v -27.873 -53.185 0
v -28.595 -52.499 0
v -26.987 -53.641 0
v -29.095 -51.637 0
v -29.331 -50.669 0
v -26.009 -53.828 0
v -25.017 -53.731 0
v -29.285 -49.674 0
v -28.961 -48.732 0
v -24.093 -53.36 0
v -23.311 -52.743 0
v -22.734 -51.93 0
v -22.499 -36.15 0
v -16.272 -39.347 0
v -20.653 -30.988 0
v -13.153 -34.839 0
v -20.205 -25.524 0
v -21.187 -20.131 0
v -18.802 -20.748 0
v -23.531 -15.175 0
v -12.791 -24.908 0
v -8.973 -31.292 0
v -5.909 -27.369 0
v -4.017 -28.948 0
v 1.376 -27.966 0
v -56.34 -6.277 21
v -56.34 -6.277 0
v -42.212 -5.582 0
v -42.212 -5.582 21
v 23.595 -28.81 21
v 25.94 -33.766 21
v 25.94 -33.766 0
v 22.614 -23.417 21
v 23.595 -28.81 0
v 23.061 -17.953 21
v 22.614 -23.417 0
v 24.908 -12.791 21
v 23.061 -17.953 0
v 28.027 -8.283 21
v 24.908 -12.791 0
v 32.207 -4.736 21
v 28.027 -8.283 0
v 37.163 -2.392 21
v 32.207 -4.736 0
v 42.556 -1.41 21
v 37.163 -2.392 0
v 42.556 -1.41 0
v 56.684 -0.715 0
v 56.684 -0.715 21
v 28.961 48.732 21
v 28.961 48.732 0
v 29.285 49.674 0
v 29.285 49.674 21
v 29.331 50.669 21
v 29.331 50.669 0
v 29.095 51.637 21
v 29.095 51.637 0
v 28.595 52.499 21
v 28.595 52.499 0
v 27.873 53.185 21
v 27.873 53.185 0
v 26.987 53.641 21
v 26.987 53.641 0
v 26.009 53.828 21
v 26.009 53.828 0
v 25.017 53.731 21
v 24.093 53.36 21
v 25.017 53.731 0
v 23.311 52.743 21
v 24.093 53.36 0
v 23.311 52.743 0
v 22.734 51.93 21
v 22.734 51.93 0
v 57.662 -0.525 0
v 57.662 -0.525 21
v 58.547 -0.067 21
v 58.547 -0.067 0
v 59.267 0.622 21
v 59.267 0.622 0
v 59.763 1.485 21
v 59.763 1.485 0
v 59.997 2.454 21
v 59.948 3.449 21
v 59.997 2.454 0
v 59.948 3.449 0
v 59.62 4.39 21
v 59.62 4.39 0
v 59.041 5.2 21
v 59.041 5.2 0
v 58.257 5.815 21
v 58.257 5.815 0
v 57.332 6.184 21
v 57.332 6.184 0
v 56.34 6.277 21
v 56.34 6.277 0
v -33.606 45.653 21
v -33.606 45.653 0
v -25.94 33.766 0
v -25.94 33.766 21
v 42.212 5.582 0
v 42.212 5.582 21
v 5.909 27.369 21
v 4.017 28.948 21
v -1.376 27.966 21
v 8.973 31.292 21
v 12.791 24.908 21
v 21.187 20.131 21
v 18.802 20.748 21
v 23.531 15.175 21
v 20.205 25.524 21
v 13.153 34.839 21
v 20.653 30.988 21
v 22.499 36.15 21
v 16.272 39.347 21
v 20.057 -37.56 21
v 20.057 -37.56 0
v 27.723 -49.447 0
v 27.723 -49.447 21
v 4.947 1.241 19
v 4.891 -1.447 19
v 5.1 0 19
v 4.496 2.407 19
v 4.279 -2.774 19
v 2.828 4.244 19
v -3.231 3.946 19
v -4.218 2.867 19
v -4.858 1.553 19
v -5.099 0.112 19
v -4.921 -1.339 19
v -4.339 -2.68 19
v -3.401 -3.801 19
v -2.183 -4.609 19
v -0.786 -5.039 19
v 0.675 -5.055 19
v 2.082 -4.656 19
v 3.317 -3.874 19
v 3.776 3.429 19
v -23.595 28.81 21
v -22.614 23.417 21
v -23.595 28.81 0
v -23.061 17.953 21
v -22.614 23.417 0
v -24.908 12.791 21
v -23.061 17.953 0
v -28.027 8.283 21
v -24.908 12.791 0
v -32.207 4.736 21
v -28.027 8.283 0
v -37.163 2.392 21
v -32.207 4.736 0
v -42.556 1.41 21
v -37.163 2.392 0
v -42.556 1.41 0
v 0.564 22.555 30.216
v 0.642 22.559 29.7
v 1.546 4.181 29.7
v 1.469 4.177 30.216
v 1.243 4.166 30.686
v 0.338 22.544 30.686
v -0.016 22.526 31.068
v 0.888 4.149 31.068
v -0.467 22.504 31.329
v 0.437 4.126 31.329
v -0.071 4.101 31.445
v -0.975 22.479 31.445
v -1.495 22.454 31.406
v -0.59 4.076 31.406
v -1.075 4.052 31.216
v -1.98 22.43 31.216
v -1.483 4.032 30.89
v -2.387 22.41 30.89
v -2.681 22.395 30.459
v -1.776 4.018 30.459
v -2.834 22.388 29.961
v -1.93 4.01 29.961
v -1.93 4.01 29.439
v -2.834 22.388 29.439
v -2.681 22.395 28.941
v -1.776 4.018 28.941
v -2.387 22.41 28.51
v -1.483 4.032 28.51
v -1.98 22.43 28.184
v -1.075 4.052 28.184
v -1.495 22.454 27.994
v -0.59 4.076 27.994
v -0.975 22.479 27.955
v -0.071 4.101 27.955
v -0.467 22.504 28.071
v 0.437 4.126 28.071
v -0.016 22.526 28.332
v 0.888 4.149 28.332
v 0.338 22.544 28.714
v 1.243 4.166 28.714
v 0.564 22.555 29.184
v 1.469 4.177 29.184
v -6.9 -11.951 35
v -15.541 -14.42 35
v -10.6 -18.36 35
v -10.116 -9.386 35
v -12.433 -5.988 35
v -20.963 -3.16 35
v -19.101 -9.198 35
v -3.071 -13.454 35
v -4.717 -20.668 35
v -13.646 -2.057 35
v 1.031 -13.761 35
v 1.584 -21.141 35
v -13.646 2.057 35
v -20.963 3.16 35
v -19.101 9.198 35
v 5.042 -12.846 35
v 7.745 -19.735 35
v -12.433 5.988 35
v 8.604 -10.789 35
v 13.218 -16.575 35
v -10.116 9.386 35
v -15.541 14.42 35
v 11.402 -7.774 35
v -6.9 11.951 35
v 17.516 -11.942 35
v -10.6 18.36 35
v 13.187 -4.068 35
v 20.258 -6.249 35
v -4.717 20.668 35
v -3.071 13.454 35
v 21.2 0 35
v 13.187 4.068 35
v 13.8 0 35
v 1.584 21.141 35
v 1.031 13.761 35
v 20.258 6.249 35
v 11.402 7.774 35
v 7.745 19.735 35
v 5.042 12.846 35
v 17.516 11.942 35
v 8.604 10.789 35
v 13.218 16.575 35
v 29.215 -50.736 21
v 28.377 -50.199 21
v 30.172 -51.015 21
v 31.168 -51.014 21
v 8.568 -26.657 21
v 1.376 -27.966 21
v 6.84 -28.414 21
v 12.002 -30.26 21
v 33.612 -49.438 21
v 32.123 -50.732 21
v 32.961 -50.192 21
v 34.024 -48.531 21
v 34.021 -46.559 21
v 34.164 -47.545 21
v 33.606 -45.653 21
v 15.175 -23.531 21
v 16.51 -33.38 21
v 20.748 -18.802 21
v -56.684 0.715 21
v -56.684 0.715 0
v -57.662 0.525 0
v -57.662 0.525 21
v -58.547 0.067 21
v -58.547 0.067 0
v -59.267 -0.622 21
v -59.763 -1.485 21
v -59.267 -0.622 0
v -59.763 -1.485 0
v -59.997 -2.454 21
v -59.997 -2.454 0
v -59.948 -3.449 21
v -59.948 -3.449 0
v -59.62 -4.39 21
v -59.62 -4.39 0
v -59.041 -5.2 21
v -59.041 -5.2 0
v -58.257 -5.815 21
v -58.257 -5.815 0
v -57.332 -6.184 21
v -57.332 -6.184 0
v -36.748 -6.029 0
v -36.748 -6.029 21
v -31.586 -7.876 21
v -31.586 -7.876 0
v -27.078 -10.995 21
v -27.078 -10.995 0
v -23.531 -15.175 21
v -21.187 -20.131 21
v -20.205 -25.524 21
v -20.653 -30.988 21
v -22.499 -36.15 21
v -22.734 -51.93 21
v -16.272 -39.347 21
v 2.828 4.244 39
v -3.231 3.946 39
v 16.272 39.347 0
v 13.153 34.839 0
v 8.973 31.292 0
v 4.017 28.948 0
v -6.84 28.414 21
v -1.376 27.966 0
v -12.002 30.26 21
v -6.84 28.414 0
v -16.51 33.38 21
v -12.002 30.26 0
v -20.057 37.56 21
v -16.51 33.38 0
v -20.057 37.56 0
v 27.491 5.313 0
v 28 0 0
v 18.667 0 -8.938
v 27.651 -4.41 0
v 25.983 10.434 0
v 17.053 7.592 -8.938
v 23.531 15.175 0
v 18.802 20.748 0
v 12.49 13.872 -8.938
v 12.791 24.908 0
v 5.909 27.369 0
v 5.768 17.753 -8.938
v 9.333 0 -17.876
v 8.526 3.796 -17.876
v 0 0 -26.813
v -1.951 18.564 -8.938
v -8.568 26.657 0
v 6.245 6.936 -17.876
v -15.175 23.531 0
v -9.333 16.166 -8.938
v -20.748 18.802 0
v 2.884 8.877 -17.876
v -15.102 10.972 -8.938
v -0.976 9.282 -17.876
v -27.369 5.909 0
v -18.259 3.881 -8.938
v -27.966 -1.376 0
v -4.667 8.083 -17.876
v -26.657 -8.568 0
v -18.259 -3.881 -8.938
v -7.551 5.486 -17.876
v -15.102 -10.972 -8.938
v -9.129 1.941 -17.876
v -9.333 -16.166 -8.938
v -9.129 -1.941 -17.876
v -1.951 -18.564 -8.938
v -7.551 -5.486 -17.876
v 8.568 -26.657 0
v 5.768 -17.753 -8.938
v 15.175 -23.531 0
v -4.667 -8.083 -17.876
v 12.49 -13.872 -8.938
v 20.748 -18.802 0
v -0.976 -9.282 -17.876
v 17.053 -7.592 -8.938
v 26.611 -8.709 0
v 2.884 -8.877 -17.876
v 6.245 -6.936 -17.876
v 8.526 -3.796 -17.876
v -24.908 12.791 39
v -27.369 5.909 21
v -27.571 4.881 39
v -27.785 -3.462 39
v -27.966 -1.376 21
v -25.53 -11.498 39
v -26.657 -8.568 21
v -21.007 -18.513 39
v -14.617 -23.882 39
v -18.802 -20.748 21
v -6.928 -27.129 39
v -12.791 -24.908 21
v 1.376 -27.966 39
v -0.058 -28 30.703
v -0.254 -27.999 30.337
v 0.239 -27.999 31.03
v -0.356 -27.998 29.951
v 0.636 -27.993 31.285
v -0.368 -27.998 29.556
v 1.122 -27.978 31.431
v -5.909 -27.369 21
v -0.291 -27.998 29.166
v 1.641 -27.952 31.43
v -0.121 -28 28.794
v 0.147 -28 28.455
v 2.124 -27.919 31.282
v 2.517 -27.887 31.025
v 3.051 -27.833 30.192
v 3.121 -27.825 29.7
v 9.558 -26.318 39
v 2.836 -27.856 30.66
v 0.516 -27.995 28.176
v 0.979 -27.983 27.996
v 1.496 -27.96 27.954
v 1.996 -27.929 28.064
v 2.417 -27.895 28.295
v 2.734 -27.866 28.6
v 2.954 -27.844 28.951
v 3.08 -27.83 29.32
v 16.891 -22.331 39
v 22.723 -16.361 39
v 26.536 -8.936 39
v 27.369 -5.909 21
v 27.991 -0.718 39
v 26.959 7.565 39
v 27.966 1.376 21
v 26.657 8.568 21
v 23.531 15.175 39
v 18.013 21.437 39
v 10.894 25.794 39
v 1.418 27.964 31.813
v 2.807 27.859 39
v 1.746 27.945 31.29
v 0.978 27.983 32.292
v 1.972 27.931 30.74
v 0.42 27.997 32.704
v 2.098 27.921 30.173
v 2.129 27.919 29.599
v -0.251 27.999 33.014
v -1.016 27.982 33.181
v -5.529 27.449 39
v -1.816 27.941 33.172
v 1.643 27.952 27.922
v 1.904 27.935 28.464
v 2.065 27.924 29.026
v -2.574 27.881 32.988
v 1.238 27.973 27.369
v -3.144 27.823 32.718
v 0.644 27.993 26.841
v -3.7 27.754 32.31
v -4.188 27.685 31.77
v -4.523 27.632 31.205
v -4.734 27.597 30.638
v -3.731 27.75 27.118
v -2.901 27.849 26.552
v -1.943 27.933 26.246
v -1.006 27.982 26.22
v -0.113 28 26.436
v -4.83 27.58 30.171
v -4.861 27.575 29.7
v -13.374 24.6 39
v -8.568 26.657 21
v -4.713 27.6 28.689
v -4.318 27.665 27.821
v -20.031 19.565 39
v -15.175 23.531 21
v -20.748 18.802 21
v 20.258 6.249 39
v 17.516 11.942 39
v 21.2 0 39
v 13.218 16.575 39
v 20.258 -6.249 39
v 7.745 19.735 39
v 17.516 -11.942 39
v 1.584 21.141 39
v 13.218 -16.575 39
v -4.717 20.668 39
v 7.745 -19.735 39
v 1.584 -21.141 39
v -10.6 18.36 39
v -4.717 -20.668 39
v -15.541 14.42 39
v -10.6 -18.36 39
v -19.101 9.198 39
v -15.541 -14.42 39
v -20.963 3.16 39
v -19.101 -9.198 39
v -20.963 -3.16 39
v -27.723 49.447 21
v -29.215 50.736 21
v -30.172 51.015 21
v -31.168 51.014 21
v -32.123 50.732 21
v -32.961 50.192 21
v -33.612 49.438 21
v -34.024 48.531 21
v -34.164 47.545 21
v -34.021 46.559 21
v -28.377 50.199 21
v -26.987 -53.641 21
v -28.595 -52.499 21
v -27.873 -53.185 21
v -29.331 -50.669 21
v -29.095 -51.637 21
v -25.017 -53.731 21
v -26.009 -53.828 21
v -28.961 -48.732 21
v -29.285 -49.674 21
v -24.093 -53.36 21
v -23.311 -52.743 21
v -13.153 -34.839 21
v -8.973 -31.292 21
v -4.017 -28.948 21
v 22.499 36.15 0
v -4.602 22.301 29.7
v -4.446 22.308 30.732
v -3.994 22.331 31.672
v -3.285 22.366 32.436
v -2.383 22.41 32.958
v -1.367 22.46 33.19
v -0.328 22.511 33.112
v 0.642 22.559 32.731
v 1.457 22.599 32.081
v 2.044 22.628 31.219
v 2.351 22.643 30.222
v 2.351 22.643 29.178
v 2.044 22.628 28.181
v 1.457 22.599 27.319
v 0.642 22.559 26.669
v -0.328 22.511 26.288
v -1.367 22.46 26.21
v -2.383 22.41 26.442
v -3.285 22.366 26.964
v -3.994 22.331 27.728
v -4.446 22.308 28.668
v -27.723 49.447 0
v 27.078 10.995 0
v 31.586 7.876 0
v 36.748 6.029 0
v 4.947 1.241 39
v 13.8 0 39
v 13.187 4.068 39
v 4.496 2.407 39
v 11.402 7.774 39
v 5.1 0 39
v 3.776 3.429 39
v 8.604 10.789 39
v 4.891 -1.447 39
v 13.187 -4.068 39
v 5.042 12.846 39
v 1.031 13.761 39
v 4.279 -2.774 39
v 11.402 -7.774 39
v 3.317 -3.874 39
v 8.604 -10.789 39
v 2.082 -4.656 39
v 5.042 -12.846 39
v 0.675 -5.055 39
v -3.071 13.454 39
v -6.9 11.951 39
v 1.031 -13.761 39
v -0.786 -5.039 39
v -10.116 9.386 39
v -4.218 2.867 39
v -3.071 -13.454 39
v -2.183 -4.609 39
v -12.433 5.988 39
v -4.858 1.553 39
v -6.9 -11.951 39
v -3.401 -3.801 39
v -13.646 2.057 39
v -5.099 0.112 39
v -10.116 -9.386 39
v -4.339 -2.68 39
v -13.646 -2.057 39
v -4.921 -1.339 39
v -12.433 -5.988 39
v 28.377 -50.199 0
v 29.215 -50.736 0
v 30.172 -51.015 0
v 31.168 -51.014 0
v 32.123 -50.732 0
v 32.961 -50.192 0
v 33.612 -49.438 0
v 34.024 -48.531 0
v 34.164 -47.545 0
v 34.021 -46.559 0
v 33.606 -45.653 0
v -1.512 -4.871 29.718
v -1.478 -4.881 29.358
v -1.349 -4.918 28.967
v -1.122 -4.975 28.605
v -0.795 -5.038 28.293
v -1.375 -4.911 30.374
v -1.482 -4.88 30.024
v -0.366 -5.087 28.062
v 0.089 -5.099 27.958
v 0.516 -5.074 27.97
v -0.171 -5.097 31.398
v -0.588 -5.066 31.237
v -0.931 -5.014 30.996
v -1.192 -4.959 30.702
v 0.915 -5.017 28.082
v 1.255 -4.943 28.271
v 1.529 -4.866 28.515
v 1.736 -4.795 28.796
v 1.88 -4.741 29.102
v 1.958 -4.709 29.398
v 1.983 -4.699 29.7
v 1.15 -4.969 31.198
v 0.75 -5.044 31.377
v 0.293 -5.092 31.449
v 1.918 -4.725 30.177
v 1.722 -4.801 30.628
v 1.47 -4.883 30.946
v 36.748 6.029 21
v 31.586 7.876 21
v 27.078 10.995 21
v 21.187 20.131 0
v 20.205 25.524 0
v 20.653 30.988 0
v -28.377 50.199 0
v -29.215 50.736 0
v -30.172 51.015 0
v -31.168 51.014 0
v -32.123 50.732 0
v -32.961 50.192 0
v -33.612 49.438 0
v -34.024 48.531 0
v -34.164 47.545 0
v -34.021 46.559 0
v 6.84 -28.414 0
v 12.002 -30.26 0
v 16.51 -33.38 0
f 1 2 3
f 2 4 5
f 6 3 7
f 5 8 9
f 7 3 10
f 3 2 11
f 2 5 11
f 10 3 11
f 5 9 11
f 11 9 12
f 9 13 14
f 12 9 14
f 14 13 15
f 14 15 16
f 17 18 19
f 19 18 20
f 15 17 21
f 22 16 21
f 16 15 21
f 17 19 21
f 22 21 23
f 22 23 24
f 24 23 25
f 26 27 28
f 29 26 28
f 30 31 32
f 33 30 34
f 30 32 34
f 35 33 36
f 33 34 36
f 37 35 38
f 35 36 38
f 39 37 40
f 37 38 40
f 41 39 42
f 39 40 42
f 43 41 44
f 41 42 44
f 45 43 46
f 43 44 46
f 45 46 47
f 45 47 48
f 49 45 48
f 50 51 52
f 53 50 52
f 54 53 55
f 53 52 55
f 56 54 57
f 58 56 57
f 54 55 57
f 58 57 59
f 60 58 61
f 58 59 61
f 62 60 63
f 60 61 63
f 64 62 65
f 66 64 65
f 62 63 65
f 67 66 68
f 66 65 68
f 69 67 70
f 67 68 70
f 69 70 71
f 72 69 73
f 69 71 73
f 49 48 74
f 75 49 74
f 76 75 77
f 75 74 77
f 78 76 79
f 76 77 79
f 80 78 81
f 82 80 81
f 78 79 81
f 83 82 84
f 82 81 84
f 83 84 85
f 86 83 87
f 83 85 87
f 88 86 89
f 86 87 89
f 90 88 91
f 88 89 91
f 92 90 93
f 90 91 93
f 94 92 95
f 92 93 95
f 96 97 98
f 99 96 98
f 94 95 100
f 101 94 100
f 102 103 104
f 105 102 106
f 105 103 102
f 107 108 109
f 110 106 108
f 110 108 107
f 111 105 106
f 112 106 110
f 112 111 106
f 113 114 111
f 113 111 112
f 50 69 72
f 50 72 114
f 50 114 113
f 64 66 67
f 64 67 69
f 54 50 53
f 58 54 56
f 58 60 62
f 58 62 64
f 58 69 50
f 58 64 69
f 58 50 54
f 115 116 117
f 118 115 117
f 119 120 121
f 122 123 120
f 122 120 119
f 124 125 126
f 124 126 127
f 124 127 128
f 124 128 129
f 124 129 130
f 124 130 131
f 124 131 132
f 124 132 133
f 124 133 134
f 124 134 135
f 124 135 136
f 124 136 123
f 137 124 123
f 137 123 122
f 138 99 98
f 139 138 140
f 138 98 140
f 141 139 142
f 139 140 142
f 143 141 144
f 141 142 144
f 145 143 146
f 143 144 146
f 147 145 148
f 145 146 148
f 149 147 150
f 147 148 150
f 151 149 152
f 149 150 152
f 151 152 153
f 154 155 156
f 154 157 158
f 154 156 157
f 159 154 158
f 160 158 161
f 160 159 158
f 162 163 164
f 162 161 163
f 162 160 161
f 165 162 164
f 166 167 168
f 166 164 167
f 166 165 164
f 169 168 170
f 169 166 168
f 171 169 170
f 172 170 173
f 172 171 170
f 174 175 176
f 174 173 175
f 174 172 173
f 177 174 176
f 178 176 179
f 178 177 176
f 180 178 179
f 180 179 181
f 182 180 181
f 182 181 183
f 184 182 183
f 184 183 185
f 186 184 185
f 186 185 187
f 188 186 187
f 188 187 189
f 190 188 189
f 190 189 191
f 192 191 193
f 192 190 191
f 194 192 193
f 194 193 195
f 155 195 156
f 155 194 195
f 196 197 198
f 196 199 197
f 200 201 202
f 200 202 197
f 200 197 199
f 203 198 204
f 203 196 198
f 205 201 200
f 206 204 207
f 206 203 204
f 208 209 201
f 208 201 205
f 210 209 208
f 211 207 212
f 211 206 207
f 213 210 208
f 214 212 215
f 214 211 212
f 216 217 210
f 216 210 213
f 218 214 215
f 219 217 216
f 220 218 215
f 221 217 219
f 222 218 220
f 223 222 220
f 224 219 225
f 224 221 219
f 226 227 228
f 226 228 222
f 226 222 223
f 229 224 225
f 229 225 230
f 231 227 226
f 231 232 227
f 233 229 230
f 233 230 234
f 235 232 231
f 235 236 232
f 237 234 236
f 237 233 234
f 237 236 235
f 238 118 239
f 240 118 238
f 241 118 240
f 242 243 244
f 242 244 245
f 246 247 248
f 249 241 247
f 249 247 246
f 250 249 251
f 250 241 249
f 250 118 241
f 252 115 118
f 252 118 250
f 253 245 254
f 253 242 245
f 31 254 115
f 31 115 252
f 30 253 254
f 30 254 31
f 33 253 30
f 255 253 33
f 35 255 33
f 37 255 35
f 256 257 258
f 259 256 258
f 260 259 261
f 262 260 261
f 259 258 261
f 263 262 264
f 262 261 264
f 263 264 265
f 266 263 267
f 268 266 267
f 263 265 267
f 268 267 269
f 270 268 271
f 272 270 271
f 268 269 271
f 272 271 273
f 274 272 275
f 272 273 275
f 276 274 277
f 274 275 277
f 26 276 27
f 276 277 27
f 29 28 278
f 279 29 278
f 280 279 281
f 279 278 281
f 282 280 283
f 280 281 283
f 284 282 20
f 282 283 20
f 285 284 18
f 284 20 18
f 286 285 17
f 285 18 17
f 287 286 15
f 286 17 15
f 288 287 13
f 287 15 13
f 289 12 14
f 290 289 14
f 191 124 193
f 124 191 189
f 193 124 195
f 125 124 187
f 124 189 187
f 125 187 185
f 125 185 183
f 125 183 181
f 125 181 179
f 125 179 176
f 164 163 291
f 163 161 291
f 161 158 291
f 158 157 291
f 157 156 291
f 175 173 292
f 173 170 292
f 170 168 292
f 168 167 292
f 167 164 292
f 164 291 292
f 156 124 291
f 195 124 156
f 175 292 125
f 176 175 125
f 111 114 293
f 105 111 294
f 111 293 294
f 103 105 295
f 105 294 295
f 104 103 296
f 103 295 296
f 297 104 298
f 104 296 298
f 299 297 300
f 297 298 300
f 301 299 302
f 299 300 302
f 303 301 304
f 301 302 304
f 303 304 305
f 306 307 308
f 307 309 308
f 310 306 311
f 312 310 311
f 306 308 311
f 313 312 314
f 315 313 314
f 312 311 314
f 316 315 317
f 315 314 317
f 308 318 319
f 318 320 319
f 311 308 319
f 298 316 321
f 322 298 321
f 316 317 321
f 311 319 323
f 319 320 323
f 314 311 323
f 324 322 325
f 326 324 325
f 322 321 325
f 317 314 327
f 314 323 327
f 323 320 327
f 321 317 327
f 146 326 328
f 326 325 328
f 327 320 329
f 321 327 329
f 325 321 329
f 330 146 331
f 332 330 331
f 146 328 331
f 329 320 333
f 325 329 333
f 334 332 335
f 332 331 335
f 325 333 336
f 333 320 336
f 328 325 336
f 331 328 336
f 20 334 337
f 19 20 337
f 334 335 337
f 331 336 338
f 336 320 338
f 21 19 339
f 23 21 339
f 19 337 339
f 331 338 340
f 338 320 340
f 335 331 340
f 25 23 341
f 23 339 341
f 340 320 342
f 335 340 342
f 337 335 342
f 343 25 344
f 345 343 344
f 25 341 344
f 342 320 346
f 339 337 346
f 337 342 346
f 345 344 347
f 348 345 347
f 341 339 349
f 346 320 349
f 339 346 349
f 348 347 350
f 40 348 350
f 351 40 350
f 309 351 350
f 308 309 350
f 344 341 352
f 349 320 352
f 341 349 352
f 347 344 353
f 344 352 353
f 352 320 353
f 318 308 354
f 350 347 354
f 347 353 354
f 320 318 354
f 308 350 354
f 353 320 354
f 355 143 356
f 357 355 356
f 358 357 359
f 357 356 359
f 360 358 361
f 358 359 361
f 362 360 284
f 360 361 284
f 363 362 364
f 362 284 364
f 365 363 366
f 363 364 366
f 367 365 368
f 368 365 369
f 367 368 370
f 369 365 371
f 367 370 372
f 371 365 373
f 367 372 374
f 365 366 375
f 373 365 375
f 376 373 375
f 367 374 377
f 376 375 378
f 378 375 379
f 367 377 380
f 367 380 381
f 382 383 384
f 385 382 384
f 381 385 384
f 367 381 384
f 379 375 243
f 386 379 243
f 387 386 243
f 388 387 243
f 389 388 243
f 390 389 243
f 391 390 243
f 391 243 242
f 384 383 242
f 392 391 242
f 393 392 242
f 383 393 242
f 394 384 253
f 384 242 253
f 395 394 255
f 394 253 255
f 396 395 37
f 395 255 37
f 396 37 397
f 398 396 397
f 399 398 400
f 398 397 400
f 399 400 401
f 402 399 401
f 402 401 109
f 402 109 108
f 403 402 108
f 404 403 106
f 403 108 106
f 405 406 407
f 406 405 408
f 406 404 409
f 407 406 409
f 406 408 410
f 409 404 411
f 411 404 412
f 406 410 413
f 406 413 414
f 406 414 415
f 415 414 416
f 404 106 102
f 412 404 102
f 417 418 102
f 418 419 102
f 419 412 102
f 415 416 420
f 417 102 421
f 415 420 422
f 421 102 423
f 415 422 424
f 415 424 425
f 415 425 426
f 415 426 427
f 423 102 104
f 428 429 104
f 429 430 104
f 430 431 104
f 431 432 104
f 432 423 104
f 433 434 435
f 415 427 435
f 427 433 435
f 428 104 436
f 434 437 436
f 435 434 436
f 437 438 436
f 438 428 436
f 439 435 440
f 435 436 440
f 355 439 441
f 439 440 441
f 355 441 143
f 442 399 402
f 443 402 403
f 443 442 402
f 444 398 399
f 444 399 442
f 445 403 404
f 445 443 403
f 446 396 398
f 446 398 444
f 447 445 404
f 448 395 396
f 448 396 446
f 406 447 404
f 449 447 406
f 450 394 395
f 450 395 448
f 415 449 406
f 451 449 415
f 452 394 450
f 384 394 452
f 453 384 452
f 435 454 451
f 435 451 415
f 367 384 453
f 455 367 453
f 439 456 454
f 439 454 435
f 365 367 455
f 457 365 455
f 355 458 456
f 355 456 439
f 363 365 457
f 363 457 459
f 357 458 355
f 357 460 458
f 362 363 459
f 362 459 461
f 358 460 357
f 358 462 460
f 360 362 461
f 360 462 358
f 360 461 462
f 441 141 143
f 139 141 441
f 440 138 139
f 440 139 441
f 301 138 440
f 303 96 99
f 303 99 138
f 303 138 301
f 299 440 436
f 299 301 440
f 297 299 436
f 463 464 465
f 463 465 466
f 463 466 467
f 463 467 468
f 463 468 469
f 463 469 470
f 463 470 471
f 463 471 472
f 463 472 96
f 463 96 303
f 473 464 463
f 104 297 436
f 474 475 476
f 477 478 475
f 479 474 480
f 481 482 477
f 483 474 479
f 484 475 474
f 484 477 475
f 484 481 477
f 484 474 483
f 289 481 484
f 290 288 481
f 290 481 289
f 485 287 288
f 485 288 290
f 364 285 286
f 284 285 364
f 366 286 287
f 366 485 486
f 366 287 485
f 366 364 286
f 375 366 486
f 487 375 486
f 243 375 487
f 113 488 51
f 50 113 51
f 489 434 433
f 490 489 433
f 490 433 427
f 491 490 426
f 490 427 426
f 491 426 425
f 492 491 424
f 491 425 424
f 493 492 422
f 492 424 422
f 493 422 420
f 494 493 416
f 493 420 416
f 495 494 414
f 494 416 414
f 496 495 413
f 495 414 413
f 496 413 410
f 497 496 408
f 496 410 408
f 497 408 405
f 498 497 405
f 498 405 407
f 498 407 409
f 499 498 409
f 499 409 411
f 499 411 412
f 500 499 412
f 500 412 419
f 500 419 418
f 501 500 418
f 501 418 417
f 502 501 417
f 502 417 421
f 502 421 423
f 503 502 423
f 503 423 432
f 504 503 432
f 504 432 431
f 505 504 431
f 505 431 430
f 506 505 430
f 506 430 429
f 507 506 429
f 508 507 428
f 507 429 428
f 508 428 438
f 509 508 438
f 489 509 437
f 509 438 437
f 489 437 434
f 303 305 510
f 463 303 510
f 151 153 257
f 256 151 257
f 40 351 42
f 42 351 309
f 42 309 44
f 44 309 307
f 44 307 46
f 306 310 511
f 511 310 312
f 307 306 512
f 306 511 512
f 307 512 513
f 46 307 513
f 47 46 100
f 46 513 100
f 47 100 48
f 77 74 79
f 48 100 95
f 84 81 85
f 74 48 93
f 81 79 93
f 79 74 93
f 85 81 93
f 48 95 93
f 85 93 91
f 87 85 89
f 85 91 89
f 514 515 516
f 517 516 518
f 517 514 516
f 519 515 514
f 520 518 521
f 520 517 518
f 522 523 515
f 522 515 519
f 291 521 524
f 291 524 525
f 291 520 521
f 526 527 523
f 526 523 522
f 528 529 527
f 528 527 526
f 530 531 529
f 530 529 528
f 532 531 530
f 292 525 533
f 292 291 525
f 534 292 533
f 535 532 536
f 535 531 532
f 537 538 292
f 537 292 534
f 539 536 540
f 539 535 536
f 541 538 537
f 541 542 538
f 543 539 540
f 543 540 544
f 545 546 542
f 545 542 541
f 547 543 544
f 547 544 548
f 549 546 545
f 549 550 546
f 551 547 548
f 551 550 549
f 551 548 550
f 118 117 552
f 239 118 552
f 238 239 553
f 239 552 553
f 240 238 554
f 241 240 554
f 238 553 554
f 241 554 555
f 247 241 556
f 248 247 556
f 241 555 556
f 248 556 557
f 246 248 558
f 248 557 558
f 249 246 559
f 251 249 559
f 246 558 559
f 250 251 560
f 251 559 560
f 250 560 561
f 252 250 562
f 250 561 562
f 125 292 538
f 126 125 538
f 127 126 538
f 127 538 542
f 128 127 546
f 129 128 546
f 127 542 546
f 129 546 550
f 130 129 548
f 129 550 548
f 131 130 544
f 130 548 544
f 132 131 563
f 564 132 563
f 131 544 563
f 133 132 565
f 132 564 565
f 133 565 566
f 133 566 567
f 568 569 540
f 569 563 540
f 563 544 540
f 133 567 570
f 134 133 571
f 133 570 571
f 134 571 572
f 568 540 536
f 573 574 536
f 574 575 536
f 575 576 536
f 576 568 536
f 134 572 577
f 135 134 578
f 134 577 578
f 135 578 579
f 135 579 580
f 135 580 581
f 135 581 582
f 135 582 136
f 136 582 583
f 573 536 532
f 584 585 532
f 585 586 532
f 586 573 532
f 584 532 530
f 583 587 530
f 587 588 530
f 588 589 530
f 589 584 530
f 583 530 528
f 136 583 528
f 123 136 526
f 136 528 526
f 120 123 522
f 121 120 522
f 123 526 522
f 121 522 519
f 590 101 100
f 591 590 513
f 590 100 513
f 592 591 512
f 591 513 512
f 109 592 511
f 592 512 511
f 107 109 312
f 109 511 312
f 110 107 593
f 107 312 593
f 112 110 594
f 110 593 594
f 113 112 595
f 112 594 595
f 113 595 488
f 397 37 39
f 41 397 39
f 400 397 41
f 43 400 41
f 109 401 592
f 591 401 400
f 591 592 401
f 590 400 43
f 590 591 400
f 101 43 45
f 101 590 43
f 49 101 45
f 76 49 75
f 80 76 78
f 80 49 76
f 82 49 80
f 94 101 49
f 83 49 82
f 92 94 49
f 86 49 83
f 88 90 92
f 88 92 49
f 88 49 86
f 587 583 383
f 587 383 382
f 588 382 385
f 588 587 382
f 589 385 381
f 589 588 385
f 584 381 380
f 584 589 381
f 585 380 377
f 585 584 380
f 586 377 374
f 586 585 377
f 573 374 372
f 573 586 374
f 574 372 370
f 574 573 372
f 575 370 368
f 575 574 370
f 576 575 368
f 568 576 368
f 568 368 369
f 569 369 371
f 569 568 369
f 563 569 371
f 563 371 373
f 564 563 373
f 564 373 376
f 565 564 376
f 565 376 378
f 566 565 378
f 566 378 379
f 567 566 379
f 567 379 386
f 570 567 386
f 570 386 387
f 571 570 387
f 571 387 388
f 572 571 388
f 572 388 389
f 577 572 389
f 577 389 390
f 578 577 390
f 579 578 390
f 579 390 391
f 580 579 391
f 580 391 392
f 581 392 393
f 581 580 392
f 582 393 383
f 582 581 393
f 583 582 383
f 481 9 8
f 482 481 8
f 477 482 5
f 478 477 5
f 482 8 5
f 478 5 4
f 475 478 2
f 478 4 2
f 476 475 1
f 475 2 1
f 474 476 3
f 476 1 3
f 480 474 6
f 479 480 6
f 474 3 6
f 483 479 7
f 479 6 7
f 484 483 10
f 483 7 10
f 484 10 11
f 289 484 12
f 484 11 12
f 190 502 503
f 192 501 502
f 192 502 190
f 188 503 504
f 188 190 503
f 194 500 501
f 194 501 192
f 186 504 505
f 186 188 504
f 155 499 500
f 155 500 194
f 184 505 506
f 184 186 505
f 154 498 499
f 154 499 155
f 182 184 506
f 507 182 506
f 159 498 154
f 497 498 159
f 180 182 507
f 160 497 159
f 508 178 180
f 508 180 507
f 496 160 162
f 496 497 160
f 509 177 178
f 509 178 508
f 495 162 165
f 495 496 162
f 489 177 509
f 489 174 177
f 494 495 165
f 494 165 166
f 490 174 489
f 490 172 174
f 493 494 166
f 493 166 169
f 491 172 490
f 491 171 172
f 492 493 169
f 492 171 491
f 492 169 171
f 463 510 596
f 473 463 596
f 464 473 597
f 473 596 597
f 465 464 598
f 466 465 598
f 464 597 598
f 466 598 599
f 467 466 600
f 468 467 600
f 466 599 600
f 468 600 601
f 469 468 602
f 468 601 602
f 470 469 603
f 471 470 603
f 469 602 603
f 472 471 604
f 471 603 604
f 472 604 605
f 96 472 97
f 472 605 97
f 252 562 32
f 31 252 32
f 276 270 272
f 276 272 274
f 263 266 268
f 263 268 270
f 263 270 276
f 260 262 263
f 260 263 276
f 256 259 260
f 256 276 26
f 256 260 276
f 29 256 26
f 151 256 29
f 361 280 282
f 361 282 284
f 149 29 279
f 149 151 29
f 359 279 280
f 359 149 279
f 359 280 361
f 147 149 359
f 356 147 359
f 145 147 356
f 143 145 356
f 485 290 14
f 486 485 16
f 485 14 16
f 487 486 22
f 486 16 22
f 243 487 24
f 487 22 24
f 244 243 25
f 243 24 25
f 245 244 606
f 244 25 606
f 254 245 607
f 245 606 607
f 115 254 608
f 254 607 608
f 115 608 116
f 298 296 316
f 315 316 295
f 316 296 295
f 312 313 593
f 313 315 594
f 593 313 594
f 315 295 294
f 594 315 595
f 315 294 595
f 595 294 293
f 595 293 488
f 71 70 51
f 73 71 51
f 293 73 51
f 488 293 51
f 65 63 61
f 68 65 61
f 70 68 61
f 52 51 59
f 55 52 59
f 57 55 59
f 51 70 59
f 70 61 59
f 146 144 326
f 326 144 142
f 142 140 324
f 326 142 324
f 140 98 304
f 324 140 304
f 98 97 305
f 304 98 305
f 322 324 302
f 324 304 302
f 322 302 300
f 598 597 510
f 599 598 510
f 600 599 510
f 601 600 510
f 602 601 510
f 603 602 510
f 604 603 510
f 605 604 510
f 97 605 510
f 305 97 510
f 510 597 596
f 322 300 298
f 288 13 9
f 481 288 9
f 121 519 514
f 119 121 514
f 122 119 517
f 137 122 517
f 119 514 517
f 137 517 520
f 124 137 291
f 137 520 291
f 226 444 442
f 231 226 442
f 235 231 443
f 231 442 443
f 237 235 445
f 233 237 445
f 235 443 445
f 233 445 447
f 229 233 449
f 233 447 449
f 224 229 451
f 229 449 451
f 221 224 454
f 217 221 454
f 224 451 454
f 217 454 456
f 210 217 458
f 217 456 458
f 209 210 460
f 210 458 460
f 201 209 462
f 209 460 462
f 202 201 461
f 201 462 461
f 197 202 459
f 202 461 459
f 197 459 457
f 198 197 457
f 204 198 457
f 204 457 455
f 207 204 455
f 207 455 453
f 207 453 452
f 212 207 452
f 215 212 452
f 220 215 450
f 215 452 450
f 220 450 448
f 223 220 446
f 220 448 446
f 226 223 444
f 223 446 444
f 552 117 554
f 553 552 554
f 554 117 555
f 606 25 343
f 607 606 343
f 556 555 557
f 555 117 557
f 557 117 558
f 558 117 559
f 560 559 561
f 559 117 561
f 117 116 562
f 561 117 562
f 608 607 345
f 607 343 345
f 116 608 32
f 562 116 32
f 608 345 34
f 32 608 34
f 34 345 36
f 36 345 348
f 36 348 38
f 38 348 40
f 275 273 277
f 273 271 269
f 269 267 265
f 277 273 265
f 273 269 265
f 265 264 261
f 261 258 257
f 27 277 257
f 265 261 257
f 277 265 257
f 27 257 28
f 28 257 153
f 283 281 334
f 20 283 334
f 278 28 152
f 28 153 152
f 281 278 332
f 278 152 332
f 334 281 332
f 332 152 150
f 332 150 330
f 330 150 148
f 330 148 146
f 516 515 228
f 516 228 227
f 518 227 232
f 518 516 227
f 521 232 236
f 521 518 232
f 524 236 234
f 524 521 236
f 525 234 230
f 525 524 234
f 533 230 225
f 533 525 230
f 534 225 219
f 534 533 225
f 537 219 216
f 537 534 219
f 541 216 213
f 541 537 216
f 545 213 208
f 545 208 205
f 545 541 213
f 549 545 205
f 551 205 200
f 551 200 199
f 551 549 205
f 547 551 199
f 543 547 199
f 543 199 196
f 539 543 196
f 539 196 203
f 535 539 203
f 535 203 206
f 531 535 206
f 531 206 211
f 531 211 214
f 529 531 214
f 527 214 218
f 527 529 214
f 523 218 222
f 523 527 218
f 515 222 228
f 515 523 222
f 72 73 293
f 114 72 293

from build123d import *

# Parameters (mm, degrees)
SKETCH1_R               = 3.5
BOSS_EXTRUDE1_DEPTH     = 21
SKETCH4_R               = 28
BOSS_EXTRUDE2_DEPTH     = 18
SKETCH6_R               = 21.2
SKETCH6_R_2             = 13.8
CUT_EXTRUDE1_DEPTH      = 4
CUT_EXTRUDE2_DEPTH      = 20
CUT_EXTRUDE3_DEPTH      = 93.206949894
CUT_EXTRUDE3_DEPTH_BACK = 93.206949894
SKETCH7_R               = 1.75
SKETCH8_R               = 3.5
CUT_EXTRUDE4_DEPTH      = 5.5


with BuildPart() as part:
    # Sketch1 → Boss-Extrude1 (new body)
    with BuildSketch(Plane.XY):
        with BuildLine():
            ThreePointArc((-27.16441994, 47.550254291), (-29.67571676, 44.192804958), (-33.605829095, 45.653385243))
            Line((-33.605829095, 45.653385243), (-25.93972411, 33.765821671))
            ThreePointArc((-25.93972411, 33.765821671), (-24.90753088, 12.791204222), (-42.555985811, 1.409989939))
            Line((-42.555985811, 1.409989939), (-56.683970347, 0.71473006))
            ThreePointArc((-56.683970347, 0.71473006), (-54.098653318, -0.246072778), (-53.011938142, -2.781039515))
            ThreePointArc((-53.011938142, -2.781039515), (-53.976971405, -5.194324339), (-56.339905937, -6.27680909))
            Line((-56.339905937, -6.27680909), (-42.211921401, -5.581549211))
            ThreePointArc((-42.211921401, -5.581549211), (-23.531273241, -15.174952377), (-22.499080012, -36.149569826))
            Line((-22.499080012, -36.149569826), (-28.960959562, -48.732393278))
            ThreePointArc((-28.960959562, -48.732393278), (-25.025035607, -46.929305801), (-22.347518202, -50.331293805))
            ThreePointArc((-22.347518202, -50.331293805), (-22.445530198, -51.153776401), (-22.734076842, -51.930194333))
            Line((-22.734076842, -51.930194333), (-16.272197292, -39.347370882))
            ThreePointArc((-16.272197292, -39.347370882), (1.376257639, -27.966156599), (20.0569058, -37.559559765))
            Line((20.0569058, -37.559559765), (27.723010785, -49.447123338))
            ThreePointArc((27.723010785, -49.447123338), (28.767550893, -44.608845135), (33.605829095, -45.653385243))
            Line((33.605829095, -45.653385243), (25.93972411, -33.765821671))
            ThreePointArc((25.93972411, -33.765821671), (24.90753088, -12.791204222), (42.555985811, -1.409989939))
            Line((42.555985811, -1.409989939), (56.683970347, -0.71473006))
            ThreePointArc((56.683970347, -0.71473006), (53.016168567, 2.60900731), (56.339905937, 6.27680909))
            Line((56.339905937, 6.27680909), (42.211921401, 5.581549211))
            ThreePointArc((42.211921401, 5.581549211), (23.531273241, 15.174952377), (22.499080012, 36.149569826))
            Line((22.499080012, 36.149569826), (28.960959562, 48.732393278))
            ThreePointArc((28.960959562, 48.732393278), (24.248617674, 47.217852445), (22.734076842, 51.930194333))
            Line((22.734076842, 51.930194333), (16.272197292, 39.347370882))
            ThreePointArc((16.272197292, 39.347370882), (-1.376257639, 27.966156599), (-20.0569058, 37.559559765))
            Line((-20.0569058, 37.559559765), (-27.723010785, 49.447123338))
            ThreePointArc((-27.723010785, 49.447123338), (-27.306970607, 48.538957471), (-27.16441994, 47.550254291))
        make_face()
        with Locations((-56.511938142, -2.781039515)):
            Circle(SKETCH1_R)
        with Locations((-30.66441994, 47.550254291)):
            Circle(SKETCH1_R)
        with Locations((25.847518202, 50.331293805)):
            Circle(SKETCH1_R)
        with Locations((56.511938142, 2.781039515)):
            Circle(SKETCH1_R)
        with Locations((30.66441994, -47.550254291)):
            Circle(SKETCH1_R)
        with Locations((-25.847518202, -50.331293805)):
            Circle(SKETCH1_R)
    extrude(amount=BOSS_EXTRUDE1_DEPTH)

    # Sketch3 → Revolve1 (revolve)
    with BuildSketch(Plane(origin=(0, 0, 0), x_dir=(-0.9987913071010414, -0.04915205854685543, 0), z_dir=(0.04915205854685543, -0.9987913071010414, 0)), mode=Mode.PRIVATE) as revolve1_sk:
        Polygon((0, 0), (-28, 0), (0, 26.813467396), align=None)
    revolve(revolve1_sk.sketch.rotate(Axis((0, 0, -26.813467396), (0, 0, 1)), 357.182659299), axis=Axis((0, 0, -26.813467396), (0, 0, 1)))

    # Sketch4 → Boss-Extrude2 (add)
    with BuildSketch(Plane.XY.offset(21)):
        with Locations(Location((0, 0, 0), (0, 0, 152.817340701))):
            Circle(SKETCH4_R)
    extrude(amount=BOSS_EXTRUDE2_DEPTH)

    # Sketch6 → Cut-Extrude1 (cut)
    with BuildSketch(Plane.XY.offset(39)):
        Circle(SKETCH6_R)
        Circle(SKETCH6_R_2, mode=Mode.SUBTRACT)
    extrude(amount=-CUT_EXTRUDE1_DEPTH, mode=Mode.SUBTRACT)

    # Sketch5 → Cut-Extrude2 (cut)
    with BuildSketch(Plane.XY.offset(39)):
        with BuildLine():
            Line((2.82796059, 4.244129934), (-3.231007471, 3.945958784))
            ThreePointArc((-3.231007471, 3.945958784), (-2.183101223, -4.609128882), (5.1, 0))
            ThreePointArc((5.1, 0), (4.496253941, 2.407010697), (2.82796059, 4.244129934))
        make_face()
    extrude(amount=-CUT_EXTRUDE2_DEPTH, mode=Mode.SUBTRACT)

    # Sketch7 → Cut-Extrude3 (cut, two sides: drawn at the far end of the back side and taken through both)
    with BuildSketch(Plane(origin=(-0.20152344, 4.095044359, 0), x_dir=(0.9987913071010414, 0.049152058546853936, 0), z_dir=(0.049152058546853936, -0.9987913071010414, 0)).offset(-CUT_EXTRUDE3_DEPTH_BACK)):
        with Locations((0, 29.7)):
            Circle(SKETCH7_R)
    extrude(amount=CUT_EXTRUDE3_DEPTH + CUT_EXTRUDE3_DEPTH_BACK, mode=Mode.SUBTRACT)

    # Sketch8 → Cut-Extrude4 (cut)
    with BuildSketch(Plane(origin=(-1.376257639, 27.966156599, 0), x_dir=(0.9987913071010414, 0.049152058546855434, 0), z_dir=(-0.049152058546855434, 0.9987913071010414, 0))):
        with Locations(Location((0, -29.7, 0), (0, 0, 180))):
            Circle(SKETCH8_R)
    extrude(amount=-CUT_EXTRUDE4_DEPTH, mode=Mode.SUBTRACT)


solid = part.part
